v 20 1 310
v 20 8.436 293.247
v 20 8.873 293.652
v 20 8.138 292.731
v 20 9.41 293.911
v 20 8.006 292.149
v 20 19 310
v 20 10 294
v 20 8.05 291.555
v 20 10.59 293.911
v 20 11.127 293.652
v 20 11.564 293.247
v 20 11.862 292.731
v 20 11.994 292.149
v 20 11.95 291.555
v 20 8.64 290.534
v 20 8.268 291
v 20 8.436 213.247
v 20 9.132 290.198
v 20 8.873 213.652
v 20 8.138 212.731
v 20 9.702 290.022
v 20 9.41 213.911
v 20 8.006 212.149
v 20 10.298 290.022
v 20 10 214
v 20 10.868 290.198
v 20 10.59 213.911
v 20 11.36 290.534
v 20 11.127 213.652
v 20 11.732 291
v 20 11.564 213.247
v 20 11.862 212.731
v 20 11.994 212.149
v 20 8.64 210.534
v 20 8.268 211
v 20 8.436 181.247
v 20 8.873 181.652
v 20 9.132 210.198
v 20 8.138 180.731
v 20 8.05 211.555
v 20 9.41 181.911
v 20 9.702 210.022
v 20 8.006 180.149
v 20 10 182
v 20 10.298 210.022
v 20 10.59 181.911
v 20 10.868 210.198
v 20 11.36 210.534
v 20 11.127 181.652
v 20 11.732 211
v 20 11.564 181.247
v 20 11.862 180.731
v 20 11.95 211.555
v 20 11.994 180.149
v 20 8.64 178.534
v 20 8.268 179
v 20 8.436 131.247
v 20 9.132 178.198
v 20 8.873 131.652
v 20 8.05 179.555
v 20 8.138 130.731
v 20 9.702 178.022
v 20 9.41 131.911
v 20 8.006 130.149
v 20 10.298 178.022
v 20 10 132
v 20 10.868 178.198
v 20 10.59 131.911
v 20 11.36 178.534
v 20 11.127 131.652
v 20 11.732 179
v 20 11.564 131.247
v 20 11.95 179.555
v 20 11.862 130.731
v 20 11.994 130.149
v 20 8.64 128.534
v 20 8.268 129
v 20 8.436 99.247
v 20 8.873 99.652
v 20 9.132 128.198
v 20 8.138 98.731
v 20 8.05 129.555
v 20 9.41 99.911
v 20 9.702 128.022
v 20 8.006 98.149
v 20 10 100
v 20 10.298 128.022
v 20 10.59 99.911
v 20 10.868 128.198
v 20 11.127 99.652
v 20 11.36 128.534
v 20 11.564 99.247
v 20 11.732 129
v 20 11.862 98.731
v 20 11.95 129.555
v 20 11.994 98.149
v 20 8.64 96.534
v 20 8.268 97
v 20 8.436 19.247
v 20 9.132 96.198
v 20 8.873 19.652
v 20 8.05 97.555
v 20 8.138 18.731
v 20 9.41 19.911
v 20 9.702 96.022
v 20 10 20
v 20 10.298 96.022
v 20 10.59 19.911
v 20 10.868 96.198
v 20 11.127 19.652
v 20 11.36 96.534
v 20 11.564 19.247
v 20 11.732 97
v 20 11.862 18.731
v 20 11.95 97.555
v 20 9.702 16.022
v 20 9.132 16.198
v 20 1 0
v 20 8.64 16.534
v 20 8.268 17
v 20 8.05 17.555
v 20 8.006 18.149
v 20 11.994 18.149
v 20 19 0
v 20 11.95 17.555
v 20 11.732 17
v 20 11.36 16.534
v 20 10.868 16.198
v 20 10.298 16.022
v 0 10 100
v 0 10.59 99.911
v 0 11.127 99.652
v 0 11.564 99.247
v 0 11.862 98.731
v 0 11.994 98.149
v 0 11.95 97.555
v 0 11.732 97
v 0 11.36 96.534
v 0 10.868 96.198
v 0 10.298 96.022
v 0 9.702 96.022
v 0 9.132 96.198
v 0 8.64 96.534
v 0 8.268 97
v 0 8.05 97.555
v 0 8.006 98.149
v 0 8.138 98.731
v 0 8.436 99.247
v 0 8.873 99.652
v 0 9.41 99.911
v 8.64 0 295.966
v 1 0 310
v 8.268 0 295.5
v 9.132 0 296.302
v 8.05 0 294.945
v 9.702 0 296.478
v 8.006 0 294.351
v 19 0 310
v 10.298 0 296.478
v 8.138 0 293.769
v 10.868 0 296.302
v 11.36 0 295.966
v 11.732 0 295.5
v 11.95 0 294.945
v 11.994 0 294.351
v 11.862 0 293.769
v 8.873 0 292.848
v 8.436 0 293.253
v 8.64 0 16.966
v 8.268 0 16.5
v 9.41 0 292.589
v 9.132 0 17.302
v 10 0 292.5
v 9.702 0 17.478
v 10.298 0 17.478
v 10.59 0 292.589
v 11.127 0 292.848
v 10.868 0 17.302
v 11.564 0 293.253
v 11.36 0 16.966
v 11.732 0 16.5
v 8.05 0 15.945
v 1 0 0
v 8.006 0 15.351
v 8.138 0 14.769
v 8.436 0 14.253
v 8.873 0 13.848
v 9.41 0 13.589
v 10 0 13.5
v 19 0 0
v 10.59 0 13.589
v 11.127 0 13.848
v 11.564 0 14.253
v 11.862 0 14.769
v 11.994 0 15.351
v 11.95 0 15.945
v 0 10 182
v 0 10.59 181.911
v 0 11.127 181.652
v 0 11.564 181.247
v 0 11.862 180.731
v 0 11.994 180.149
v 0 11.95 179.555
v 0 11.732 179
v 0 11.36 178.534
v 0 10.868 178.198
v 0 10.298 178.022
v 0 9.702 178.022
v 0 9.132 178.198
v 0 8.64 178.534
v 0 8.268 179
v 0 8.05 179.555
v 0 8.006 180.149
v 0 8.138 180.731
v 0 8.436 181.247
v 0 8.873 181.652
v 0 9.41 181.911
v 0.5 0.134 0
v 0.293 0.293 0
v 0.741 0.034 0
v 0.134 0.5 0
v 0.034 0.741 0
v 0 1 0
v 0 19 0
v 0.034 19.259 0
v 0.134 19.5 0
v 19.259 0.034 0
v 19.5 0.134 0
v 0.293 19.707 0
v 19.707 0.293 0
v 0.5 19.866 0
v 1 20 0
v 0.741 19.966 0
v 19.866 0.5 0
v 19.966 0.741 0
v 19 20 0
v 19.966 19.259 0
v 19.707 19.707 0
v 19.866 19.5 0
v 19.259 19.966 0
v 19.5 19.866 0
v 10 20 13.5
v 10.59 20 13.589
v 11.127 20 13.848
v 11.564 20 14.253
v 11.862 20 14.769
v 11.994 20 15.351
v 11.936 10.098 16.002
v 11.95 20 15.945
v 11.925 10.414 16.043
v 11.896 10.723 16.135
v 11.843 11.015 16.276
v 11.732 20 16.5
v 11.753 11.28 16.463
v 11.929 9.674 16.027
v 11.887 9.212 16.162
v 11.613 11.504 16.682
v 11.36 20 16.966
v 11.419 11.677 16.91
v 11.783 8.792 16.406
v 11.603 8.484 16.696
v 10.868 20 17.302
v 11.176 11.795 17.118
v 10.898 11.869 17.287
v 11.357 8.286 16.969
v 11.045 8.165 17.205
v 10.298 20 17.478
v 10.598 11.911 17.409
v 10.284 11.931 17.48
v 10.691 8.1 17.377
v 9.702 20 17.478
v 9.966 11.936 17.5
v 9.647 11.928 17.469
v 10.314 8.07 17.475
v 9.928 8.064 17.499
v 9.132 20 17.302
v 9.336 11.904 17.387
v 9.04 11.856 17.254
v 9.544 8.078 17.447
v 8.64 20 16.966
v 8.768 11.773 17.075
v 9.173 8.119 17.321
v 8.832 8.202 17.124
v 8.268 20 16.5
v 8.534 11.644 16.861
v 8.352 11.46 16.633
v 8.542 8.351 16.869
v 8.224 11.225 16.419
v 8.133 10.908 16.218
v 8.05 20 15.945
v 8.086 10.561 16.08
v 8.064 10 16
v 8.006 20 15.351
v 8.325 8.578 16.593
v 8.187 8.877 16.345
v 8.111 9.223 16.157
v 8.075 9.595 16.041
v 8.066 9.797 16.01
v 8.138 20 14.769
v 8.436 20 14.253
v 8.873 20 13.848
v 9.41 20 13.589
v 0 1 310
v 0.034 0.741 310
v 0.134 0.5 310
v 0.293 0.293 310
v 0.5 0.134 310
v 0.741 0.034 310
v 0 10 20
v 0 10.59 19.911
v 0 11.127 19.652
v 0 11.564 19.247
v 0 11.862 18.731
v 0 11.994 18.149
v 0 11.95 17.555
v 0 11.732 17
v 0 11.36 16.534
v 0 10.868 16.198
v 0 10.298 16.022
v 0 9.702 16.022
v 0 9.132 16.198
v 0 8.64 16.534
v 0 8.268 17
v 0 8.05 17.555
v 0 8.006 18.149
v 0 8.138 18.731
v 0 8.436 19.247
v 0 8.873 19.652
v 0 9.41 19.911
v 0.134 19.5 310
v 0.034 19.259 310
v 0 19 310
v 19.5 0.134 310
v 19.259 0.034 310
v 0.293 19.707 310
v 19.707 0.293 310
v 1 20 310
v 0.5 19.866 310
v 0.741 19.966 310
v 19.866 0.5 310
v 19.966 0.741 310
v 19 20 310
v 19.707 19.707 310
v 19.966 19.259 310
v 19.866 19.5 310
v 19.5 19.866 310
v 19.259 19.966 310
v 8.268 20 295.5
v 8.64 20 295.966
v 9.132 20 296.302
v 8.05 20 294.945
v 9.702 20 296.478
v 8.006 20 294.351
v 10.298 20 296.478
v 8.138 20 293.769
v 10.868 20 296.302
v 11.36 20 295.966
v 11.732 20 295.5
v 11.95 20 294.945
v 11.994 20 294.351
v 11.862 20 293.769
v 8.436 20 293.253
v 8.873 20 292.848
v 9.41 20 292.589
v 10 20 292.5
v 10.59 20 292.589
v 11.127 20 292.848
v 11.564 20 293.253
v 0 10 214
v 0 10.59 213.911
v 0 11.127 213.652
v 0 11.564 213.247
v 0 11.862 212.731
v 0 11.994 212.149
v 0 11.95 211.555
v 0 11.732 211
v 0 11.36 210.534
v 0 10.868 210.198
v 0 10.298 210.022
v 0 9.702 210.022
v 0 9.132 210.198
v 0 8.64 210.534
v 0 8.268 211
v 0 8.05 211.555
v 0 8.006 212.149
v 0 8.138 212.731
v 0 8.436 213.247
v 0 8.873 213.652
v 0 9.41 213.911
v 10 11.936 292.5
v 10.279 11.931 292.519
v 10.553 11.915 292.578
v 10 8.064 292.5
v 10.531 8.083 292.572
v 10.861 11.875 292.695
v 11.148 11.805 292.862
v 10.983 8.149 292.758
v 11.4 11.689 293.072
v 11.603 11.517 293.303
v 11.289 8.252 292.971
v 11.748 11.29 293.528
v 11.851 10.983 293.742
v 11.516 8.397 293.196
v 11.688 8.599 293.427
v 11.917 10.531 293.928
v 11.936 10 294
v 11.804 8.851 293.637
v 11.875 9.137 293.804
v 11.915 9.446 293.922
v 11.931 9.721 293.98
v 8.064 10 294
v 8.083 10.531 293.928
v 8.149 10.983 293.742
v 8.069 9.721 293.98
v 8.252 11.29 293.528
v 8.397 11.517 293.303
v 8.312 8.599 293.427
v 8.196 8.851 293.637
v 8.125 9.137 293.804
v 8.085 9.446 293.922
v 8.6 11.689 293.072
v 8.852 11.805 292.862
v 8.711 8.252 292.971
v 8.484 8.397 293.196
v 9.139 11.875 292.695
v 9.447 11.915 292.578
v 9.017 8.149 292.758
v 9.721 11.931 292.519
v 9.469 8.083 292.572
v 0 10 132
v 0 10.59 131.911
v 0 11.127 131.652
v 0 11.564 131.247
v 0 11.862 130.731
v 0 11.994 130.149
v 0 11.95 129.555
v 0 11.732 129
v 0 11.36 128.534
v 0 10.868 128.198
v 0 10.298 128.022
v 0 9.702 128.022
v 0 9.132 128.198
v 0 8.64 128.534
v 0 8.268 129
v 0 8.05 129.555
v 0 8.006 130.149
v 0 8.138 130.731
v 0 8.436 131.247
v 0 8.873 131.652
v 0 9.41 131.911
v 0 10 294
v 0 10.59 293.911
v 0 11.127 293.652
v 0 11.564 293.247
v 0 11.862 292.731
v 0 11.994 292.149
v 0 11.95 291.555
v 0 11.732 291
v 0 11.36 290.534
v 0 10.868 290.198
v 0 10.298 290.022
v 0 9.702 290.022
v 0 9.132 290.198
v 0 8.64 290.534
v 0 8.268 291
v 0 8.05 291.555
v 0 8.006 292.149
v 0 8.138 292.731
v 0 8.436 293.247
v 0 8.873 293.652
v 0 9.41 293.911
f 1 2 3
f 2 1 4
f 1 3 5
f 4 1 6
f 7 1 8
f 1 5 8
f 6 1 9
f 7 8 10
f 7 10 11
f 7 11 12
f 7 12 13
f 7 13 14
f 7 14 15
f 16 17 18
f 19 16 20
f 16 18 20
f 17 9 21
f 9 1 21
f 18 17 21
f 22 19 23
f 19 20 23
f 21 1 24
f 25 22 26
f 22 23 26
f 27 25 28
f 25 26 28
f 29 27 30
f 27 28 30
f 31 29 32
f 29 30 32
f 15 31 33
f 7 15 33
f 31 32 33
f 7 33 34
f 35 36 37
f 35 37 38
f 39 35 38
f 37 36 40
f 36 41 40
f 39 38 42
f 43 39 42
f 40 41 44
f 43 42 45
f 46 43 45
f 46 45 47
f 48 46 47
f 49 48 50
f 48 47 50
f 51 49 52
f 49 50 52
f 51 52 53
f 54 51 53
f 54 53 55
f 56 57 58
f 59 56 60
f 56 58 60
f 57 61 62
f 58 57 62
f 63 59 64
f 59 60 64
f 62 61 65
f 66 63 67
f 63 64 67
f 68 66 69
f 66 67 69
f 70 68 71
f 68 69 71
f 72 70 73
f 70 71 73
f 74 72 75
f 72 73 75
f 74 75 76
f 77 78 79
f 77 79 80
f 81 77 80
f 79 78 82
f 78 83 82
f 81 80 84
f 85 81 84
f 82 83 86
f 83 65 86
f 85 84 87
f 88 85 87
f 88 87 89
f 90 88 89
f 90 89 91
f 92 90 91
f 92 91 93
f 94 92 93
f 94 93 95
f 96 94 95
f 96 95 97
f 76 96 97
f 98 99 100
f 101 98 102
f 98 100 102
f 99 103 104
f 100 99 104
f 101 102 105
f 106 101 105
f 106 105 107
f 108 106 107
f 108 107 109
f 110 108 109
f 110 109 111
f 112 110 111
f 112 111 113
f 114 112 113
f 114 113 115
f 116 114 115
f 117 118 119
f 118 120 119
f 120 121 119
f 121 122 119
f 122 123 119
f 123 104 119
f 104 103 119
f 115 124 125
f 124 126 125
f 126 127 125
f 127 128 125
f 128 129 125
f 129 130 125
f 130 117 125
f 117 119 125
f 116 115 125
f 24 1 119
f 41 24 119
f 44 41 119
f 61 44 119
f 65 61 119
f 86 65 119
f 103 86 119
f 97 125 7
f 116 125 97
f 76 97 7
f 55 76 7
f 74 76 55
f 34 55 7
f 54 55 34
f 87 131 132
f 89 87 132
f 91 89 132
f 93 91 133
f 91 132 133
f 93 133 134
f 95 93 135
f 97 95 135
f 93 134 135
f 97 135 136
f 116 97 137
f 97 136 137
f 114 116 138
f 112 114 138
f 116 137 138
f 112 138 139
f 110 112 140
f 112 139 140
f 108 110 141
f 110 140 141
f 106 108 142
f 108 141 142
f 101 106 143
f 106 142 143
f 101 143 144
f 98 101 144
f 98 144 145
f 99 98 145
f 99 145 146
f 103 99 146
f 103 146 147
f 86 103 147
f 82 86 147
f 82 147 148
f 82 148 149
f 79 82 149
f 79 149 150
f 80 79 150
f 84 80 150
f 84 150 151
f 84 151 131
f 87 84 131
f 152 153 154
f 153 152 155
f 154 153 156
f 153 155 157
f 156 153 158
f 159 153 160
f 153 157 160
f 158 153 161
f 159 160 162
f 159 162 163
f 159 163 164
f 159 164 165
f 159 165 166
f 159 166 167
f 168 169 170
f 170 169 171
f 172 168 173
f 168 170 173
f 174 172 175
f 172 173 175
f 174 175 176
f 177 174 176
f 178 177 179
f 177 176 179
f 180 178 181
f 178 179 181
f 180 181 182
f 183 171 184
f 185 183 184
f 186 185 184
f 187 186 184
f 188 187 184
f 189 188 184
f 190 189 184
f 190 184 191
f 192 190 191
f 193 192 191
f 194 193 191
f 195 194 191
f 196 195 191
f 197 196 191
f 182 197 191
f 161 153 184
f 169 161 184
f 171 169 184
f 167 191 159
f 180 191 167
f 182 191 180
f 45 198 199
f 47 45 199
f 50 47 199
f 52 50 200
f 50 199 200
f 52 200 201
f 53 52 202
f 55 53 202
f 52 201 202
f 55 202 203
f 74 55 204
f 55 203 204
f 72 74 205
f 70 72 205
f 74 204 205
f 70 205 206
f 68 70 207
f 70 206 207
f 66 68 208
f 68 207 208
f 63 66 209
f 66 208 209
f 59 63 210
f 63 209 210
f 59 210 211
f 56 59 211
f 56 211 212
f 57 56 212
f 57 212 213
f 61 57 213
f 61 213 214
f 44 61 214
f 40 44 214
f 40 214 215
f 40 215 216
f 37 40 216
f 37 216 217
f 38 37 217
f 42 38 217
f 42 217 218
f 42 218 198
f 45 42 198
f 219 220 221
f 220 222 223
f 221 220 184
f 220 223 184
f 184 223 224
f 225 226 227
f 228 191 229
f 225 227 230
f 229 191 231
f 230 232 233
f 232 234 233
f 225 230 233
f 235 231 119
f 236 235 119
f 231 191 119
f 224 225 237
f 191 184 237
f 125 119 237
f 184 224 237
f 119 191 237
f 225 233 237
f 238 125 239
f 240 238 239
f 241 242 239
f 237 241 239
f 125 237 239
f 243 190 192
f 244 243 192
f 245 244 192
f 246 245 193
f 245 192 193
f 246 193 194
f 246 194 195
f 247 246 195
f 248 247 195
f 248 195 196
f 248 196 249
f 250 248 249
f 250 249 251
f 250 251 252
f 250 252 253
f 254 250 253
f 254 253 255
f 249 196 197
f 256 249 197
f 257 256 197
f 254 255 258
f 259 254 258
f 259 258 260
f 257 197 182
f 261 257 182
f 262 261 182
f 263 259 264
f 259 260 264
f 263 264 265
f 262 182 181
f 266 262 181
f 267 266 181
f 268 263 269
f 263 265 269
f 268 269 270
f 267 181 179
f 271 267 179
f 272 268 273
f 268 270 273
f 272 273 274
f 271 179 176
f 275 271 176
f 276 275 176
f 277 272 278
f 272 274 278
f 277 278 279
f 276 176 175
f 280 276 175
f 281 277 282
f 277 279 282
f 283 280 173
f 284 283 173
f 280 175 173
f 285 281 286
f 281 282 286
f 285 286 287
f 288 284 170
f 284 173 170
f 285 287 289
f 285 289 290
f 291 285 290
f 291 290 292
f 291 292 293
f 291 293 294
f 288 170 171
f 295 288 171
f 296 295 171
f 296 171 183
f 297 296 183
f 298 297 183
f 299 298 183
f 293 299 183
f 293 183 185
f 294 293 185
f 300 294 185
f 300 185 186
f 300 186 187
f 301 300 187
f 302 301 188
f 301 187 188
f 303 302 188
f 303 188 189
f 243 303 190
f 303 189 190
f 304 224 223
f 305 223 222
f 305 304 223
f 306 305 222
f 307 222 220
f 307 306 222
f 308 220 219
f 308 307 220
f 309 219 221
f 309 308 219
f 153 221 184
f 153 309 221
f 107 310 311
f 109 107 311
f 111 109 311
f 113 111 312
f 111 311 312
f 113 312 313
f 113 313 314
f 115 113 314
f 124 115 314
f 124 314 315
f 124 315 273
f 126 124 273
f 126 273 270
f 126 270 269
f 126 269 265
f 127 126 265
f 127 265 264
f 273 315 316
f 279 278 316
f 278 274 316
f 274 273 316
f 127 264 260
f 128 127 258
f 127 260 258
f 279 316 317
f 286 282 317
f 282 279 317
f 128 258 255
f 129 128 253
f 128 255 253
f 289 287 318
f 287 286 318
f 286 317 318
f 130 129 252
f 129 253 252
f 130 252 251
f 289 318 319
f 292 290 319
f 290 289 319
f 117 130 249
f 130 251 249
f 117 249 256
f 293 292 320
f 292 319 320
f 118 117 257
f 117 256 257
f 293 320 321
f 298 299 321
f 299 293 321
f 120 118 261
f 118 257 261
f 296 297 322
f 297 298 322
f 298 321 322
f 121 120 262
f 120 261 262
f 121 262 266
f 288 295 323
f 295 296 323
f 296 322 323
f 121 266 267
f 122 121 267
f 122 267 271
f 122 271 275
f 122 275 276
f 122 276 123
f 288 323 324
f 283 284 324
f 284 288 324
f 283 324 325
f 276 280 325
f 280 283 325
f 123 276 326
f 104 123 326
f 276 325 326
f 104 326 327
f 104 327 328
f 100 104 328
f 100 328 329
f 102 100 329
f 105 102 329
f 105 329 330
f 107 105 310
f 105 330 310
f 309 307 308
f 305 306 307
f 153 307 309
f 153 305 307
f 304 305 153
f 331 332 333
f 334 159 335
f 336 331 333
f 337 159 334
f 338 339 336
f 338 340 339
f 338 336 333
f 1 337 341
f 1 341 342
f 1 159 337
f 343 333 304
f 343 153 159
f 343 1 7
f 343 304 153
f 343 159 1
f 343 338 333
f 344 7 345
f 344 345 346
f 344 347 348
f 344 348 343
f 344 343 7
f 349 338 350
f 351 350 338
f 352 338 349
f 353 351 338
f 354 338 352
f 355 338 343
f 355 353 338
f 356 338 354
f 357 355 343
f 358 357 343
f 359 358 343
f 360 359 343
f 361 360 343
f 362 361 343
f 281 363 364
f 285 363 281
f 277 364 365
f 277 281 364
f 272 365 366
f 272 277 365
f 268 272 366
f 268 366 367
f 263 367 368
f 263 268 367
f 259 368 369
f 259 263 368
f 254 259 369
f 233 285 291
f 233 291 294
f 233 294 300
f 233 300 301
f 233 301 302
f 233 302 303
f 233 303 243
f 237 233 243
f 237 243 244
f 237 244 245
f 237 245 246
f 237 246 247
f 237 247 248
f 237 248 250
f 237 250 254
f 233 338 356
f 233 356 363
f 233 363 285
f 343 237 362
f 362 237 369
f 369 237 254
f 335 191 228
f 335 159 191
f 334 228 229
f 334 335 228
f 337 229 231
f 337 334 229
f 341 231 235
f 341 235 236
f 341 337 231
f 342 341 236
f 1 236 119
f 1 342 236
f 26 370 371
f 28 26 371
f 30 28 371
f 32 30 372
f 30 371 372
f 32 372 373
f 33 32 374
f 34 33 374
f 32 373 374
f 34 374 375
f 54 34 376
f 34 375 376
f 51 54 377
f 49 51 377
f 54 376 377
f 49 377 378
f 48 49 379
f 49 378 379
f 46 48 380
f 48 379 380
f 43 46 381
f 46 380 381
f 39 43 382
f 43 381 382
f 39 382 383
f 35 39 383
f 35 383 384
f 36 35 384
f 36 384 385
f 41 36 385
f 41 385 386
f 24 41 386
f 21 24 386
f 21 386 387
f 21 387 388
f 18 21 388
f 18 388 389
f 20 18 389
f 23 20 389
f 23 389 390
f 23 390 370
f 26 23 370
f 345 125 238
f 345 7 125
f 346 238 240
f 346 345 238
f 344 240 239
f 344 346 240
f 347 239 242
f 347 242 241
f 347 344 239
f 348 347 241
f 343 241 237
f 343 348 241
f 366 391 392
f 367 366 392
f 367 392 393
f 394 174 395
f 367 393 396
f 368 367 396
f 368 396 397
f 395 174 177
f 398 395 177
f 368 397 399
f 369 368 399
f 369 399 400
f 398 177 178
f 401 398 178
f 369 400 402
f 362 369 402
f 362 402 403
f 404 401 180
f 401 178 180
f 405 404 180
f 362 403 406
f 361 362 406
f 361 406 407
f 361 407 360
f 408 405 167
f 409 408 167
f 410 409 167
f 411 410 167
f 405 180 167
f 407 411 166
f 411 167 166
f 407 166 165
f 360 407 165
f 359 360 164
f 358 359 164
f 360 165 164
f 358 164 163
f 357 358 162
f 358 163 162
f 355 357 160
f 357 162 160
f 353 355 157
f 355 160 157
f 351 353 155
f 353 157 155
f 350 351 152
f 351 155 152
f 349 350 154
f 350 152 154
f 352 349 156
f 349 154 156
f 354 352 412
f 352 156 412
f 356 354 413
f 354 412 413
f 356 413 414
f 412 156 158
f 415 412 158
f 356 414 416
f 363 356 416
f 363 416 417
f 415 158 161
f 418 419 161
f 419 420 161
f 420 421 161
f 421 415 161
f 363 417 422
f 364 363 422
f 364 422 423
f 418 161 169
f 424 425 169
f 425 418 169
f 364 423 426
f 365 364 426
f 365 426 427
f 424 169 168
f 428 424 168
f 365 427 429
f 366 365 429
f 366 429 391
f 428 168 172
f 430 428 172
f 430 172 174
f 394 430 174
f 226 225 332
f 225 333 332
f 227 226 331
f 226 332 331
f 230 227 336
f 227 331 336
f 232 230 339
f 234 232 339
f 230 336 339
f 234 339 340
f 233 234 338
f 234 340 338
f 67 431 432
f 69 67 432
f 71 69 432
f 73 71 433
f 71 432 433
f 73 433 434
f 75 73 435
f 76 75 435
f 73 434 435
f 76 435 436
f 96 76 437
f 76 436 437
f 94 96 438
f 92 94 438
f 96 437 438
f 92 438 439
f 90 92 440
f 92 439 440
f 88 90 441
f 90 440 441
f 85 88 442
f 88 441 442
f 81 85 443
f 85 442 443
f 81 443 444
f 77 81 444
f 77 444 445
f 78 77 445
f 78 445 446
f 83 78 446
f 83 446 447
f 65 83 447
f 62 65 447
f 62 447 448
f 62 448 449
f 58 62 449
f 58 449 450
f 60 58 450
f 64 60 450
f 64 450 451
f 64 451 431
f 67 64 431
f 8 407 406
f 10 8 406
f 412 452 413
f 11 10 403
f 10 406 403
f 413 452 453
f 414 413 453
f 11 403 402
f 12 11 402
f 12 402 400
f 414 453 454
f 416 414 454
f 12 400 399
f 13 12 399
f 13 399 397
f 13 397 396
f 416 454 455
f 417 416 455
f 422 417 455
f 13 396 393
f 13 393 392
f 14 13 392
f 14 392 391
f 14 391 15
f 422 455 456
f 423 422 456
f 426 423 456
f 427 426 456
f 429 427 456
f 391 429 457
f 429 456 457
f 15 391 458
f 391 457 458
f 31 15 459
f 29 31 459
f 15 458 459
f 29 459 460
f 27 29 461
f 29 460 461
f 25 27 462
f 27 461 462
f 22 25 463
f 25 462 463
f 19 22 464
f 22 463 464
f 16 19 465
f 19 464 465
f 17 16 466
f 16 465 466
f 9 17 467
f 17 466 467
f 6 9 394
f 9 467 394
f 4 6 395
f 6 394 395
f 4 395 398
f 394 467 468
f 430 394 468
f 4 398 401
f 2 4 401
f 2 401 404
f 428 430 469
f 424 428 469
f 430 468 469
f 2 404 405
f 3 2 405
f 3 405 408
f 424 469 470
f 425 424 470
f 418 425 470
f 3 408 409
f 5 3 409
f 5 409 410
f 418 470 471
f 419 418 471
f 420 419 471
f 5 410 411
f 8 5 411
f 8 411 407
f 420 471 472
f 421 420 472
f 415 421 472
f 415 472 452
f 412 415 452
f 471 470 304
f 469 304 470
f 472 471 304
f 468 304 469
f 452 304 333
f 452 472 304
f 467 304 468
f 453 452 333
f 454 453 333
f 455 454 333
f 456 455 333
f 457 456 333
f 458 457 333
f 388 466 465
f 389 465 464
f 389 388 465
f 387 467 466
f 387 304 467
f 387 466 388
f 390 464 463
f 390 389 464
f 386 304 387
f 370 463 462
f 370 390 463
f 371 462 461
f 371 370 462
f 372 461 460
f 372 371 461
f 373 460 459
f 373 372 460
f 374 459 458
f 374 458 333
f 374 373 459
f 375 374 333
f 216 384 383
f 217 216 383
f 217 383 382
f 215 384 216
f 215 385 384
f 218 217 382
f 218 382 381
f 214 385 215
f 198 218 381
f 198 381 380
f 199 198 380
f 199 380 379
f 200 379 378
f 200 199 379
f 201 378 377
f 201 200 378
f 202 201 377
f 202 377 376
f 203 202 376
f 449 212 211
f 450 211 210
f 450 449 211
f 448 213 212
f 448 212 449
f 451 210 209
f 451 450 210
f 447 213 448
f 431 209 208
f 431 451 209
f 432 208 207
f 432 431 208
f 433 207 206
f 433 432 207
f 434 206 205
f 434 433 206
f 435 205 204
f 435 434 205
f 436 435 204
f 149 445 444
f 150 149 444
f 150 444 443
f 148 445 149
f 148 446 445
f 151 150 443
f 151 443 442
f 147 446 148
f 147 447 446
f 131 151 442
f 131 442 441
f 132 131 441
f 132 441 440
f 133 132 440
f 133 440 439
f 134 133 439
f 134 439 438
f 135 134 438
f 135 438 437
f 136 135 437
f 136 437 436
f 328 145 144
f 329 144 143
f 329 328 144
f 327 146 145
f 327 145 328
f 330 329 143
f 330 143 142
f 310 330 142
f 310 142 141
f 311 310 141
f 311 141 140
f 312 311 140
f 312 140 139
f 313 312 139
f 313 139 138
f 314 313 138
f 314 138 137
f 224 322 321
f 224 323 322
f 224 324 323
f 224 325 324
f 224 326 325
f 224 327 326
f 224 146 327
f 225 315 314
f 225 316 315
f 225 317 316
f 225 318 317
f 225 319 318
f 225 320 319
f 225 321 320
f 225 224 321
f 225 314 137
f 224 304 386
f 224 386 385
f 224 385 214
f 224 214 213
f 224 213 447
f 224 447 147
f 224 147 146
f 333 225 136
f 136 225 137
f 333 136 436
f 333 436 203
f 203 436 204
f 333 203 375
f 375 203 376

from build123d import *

# Parameters (mm, degrees)
SKETCH_1_W          = 20
SKETCH_1_H          = 20
EXTRUDE_1_DEPTH     = 310
FILLET_1_R          = 1
SKETCH_2_R          = 2
CUT_EXTRUDE_1_DEPTH = 310
SKETCH_3_R          = 2
CUT_EXTRUDE_2_DEPTH = 20


with BuildPart() as part:
    # 草图1 → 凸台-拉伸1 (new body)
    with BuildSketch(Plane.XY):
        with Locations((10, 10)):
            Rectangle(SKETCH_1_W, SKETCH_1_H)
    extrude(amount=EXTRUDE_1_DEPTH)

    # 圆角1
    fillet_1_edges = [part.edges().sort_by_distance(p)[0] for p in [
        (0, 20, 155),
        (20, 20, 155),
        (20, 0, 155),
        (0, 0, 155),
    ]]
    fillet(fillet_1_edges, radius=FILLET_1_R)

    # 草图2 → 切除-拉伸1 (cut)
    with BuildSketch(Plane.ZY):
        with Locations((98, 10)):
            Circle(SKETCH_2_R)
        with Locations((212, 10)):
            Circle(SKETCH_2_R)
        with Locations((130, 10)):
            Circle(SKETCH_2_R)
        with Locations((180, 10)):
            Circle(SKETCH_2_R)
        with Locations((18, 10)):
            Circle(SKETCH_2_R)
        with Locations((292, 10)):
            Circle(SKETCH_2_R)
    extrude(amount=-CUT_EXTRUDE_1_DEPTH, mode=Mode.SUBTRACT)

    # 草图3 → 切除-拉伸2 (cut)
    with BuildSketch(Plane.XZ):
        with Locations(Location((10, 15.5, 0), (0, 0, 270))):
            Circle(SKETCH_3_R)
        with Locations(Location((10, 294.5, 0), (0, 0, 270))):
            Circle(SKETCH_3_R)
    extrude(amount=-CUT_EXTRUDE_2_DEPTH, mode=Mode.SUBTRACT)


solid = part.part
